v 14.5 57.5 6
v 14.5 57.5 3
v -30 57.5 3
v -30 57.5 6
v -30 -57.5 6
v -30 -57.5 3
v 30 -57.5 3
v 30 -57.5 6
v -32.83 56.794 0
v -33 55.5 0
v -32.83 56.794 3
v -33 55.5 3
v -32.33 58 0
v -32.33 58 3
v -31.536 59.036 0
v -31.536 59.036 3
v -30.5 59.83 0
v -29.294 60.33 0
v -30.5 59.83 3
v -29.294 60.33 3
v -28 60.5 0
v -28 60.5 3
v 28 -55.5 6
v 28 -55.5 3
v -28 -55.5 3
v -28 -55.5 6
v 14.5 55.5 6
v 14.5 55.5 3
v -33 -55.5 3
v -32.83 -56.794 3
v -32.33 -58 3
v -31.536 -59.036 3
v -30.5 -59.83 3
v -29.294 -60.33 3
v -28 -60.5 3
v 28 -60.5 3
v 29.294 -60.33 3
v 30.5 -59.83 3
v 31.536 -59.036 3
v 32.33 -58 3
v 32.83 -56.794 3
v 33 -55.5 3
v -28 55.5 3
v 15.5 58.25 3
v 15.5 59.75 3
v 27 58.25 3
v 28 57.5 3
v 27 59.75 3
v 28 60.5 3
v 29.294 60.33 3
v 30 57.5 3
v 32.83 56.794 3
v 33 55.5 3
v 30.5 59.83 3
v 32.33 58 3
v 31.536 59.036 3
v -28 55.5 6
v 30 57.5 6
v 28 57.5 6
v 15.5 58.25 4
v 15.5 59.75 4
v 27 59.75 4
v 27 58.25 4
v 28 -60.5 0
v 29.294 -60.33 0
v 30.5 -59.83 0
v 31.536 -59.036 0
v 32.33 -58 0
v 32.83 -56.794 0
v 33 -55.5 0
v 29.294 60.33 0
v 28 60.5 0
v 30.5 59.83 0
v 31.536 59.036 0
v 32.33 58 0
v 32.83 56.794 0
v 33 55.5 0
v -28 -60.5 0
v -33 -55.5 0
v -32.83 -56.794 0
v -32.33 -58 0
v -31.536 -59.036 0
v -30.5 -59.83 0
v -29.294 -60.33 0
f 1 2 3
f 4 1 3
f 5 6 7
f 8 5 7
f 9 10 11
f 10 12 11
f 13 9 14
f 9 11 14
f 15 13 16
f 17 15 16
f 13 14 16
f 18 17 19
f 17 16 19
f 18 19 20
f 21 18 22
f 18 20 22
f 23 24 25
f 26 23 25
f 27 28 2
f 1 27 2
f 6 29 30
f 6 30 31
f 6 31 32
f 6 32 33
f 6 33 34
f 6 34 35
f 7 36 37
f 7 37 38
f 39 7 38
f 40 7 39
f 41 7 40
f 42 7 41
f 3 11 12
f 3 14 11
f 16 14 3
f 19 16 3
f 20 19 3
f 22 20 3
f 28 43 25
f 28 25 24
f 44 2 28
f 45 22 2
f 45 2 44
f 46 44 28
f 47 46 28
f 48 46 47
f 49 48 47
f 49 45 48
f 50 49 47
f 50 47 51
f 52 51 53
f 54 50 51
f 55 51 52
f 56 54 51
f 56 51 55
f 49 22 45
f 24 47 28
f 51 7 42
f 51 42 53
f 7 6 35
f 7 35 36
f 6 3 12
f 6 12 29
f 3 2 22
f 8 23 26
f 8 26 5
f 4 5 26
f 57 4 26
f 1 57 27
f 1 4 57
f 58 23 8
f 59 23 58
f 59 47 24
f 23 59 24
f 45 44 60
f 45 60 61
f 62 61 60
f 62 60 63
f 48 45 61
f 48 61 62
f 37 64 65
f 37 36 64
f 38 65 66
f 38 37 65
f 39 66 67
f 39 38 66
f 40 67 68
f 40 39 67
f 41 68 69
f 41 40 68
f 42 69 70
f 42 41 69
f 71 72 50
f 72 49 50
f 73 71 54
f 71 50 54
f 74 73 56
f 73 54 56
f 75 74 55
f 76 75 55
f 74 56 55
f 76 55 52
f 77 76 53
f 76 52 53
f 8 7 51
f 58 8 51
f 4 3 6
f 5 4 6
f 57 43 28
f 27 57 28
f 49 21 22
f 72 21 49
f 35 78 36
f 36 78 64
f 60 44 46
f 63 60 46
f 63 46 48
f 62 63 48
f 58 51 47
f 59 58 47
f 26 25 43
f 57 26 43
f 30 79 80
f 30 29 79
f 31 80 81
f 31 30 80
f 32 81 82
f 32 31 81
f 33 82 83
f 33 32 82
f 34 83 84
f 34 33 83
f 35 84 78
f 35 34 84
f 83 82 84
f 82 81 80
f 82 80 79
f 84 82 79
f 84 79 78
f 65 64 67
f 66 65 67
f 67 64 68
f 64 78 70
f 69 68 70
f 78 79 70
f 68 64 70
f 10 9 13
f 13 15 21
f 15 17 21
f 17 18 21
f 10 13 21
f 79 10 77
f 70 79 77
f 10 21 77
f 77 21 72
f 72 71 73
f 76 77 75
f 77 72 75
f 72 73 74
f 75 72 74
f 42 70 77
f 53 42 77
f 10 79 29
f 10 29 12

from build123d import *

# Parameters (mm, degrees)
F1_DEPTH = 6
F0_W     = 66
F0_H     = 121
F0_W_2   = 11.5
F0_H_2   = 1.5
F2_DEPTH = 3
F3_R     = 5
F4_DEPTH = 4


# Not quite as in the source:
# - a feature names something its author has since deleted; it is built from what else it names


with BuildPart() as f1:
    # F0 (on Top) → F1 (new body)
    with BuildSketch(Plane.XY):
        Polygon((30, -57.5), (30, 57.5), (28, 57.5), (28, -55.5), (-28, -55.5), (-28, 55.5), (14.5, 55.5), (14.5, 57.5), (-30, 57.5), (-30, -57.5), align=None)
    extrude(amount=F1_DEPTH)

    # F0 (on Top) → F2 (join)
    with BuildSketch(Plane.XY):
        Rectangle(F0_W, F0_H)
        Polygon((28, 57.5), (30, 57.5), (30, -57.5), (-30, -57.5), (-30, 57.5), (14.5, 57.5), (14.5, 55.5), (-28, 55.5), (-28, -55.5), (28, -55.5), align=None, mode=Mode.SUBTRACT)
        with Locations((21.25, 59)):
            Rectangle(F0_W_2, F0_H_2, mode=Mode.SUBTRACT)
    extrude(amount=F2_DEPTH)

    # F3
    f3_edges = [f1.edges().sort_by_distance(p)[0] for p in [
        (-33, 60.5, 1.5),
        (-33, -60.5, 1.5),
        (33, -60.5, 1.5),
        (33, 60.5, 1.5),
    ]]
    fillet(f3_edges, radius=F3_R)

    # F0 (on Top) → F4 (join)
    with BuildSketch(Plane.XY):
        with Locations((21.25, 59)):
            Rectangle(F0_W_2, F0_H_2)
    extrude(amount=F4_DEPTH)


solid = f1.part
